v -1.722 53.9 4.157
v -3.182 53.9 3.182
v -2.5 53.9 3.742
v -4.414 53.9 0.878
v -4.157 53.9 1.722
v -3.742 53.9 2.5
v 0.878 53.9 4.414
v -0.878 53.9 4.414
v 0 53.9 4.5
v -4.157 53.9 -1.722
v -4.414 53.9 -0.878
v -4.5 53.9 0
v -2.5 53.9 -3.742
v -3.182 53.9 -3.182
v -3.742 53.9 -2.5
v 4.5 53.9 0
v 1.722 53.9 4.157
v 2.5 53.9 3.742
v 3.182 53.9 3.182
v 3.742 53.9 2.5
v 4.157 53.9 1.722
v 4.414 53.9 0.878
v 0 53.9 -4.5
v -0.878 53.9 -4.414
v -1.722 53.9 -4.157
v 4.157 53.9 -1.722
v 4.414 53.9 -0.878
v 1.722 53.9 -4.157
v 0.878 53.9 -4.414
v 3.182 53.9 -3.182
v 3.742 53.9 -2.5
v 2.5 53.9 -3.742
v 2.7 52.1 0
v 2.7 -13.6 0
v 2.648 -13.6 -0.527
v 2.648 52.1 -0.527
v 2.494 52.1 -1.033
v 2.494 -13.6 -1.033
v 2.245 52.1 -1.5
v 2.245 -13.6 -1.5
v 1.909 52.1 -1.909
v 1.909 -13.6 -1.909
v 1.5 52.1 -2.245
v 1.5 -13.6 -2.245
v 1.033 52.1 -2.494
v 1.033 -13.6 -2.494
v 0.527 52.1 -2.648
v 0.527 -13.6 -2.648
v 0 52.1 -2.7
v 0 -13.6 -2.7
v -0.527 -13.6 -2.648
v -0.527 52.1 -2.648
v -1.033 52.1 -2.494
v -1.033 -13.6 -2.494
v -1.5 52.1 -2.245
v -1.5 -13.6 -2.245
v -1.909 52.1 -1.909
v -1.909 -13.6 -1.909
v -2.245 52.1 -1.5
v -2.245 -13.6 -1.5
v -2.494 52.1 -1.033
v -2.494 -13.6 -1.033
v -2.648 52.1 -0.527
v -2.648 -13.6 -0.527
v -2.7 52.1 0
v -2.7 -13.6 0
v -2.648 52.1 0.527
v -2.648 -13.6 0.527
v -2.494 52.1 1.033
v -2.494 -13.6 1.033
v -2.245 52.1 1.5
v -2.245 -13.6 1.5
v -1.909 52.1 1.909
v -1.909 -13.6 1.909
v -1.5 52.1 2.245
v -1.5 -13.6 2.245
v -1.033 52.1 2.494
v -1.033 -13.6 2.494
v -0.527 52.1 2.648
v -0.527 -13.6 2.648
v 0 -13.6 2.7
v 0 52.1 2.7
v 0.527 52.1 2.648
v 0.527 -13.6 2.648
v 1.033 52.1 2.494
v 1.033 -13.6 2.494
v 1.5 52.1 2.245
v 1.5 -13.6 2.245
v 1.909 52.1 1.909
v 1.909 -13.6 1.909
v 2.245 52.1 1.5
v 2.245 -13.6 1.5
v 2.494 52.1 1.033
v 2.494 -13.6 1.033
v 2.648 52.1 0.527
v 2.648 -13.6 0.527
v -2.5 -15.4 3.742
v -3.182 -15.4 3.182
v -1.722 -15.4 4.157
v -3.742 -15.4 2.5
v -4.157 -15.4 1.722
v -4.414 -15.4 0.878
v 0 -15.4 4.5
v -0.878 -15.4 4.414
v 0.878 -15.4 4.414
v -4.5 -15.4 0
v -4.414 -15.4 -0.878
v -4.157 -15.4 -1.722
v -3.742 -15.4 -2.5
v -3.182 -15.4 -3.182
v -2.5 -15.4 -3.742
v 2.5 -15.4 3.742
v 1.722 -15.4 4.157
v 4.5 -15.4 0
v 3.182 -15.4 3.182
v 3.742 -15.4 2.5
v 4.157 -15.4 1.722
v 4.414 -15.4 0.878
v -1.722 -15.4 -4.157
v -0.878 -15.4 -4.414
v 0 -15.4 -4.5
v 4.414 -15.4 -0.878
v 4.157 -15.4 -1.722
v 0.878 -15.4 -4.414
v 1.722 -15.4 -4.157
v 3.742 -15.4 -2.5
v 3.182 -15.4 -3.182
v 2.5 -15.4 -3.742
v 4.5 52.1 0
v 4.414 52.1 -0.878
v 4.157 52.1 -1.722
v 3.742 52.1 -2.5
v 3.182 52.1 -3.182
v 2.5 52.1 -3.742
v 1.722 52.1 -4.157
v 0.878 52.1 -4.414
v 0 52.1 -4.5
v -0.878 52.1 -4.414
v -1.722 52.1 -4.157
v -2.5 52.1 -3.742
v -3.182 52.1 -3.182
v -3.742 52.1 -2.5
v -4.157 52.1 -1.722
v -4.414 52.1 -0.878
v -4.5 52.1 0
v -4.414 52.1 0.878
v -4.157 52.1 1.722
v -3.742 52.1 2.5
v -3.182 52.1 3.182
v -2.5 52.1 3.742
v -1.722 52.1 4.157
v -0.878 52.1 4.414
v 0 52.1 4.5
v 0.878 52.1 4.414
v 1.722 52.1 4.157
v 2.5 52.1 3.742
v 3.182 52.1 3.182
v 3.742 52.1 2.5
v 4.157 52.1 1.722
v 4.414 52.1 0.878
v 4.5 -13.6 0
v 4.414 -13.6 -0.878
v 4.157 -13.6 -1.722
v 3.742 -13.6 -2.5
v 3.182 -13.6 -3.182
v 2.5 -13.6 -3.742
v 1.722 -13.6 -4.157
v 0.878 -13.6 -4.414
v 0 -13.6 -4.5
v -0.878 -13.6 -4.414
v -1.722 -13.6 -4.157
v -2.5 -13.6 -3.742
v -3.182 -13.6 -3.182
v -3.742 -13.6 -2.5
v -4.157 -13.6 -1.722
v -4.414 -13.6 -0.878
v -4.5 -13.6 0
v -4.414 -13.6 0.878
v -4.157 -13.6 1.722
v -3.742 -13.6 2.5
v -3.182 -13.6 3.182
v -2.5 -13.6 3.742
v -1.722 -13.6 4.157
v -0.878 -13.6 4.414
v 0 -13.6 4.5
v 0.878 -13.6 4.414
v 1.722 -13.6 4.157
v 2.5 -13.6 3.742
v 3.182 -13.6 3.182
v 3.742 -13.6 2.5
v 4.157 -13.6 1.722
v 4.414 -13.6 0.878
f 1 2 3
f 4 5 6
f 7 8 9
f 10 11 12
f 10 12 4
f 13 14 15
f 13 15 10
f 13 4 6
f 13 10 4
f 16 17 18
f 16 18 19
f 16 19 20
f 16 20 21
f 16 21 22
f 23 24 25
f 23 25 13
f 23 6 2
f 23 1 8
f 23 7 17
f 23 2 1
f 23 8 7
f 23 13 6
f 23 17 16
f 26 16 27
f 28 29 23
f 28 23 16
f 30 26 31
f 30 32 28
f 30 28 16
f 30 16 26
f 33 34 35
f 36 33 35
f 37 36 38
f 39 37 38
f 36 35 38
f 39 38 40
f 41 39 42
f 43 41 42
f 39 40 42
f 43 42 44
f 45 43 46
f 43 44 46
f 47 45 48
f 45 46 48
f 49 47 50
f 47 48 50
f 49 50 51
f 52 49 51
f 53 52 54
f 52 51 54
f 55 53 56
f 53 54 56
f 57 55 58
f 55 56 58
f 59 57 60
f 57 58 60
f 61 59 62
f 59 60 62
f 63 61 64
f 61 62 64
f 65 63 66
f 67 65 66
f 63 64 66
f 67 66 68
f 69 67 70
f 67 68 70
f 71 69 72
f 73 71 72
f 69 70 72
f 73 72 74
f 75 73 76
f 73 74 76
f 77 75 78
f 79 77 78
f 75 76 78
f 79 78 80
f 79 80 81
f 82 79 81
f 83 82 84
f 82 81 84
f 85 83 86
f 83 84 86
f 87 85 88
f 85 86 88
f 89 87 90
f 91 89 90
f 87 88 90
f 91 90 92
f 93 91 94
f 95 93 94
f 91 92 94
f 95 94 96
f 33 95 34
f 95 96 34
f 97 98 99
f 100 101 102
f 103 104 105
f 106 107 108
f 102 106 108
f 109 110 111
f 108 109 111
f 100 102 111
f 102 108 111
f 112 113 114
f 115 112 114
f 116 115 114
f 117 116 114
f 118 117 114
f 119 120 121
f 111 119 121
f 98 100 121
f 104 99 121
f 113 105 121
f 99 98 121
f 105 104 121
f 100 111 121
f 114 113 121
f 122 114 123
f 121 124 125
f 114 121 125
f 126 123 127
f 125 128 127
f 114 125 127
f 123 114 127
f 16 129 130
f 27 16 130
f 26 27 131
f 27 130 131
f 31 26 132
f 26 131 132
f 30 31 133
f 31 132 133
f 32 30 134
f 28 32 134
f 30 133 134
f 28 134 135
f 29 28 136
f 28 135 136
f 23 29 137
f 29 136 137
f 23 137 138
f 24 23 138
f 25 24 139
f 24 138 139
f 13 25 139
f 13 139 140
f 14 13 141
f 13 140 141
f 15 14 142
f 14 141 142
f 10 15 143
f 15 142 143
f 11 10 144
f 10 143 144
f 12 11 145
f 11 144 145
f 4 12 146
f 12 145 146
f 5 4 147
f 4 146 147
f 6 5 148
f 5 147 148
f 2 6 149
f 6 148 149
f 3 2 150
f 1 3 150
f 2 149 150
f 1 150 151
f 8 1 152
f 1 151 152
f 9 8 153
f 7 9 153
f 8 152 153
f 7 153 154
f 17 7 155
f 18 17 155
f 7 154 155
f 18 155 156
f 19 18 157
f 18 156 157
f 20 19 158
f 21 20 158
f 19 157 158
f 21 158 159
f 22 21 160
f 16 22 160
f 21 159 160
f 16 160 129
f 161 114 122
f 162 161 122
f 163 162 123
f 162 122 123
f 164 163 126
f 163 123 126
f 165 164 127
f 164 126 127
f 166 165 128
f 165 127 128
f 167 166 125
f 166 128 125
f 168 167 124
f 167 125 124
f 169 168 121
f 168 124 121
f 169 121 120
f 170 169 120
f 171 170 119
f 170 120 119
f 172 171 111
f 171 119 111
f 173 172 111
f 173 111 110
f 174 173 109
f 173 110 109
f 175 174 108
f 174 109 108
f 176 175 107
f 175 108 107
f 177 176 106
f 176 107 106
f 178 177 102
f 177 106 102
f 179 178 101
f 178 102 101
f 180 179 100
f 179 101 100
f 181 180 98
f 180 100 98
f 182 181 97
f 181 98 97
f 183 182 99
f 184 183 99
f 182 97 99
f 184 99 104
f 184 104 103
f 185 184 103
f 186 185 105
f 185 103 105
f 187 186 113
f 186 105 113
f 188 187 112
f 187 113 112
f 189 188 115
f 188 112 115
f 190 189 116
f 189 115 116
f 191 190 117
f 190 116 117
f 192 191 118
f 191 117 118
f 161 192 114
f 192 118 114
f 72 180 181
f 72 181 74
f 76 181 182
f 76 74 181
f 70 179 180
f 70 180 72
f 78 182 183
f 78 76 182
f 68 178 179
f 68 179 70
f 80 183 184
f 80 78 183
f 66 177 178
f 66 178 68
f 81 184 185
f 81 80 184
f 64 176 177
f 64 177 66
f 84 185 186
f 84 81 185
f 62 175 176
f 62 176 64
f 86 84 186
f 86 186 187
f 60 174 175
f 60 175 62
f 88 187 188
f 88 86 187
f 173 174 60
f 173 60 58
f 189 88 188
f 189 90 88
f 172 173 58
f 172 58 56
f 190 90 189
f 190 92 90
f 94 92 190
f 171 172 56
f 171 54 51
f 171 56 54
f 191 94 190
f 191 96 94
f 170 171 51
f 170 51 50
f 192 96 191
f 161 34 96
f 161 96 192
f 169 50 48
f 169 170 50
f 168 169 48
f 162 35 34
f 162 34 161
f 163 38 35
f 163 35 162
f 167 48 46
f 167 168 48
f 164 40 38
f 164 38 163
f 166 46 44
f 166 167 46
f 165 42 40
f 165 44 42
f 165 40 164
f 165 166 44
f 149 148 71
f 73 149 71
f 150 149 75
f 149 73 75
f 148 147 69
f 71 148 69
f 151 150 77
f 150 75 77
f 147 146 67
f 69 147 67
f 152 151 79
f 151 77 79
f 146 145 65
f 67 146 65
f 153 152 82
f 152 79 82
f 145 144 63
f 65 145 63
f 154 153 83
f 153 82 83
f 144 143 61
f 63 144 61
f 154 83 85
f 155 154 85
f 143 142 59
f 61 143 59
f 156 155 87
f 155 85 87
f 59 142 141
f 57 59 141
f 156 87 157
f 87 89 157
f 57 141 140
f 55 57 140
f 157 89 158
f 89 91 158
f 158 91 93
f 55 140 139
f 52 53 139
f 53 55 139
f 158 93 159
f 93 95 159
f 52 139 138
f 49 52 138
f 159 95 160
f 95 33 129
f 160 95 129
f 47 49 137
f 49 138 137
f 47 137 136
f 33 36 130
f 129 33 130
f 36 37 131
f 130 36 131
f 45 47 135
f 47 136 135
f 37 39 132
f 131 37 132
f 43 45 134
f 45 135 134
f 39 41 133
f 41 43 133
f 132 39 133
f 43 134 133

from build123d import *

# Parameters (mm, degrees)
SKETCH1_R           = 2.5
BOSS_EXTRUDE1_DEPTH = 1
SKETCH2_R           = 1.5
BOSS_EXTRUDE2_DEPTH = 36.5
SKETCH3_R           = 2.5
BOSS_EXTRUDE3_DEPTH = 1
SCALE1_SCALE        = 1.8


with BuildPart() as part:
    # Sketch1 → Boss-Extrude1 (new body)
    with BuildSketch(Plane(origin=(0, 0, 0), x_dir=(1, 0, 0), z_dir=(0, 1, 0))):
        Circle(SKETCH1_R)
    extrude(amount=BOSS_EXTRUDE1_DEPTH)

    # Sketch2 → Boss-Extrude2 (add)
    with BuildSketch(Plane(origin=(0, 1, 0), x_dir=(1, 0, 0), z_dir=(0, 1, 0))):
        Circle(SKETCH2_R)
    extrude(amount=BOSS_EXTRUDE2_DEPTH)

    # Sketch3 → Boss-Extrude3 (add)
    with BuildSketch(Plane(origin=(0, 37.5, 0), x_dir=(1, 0, 0), z_dir=(0, 1, 0))):
        Circle(SKETCH3_R)
    extrude(amount=BOSS_EXTRUDE3_DEPTH)


with BuildPart() as part_1:
    # Scale1: scaled about (0, 19.25, 0)
    add(part.part.scale(SCALE1_SCALE).moved(Location((0, -15.4, 0))))


solid = part_1.part
